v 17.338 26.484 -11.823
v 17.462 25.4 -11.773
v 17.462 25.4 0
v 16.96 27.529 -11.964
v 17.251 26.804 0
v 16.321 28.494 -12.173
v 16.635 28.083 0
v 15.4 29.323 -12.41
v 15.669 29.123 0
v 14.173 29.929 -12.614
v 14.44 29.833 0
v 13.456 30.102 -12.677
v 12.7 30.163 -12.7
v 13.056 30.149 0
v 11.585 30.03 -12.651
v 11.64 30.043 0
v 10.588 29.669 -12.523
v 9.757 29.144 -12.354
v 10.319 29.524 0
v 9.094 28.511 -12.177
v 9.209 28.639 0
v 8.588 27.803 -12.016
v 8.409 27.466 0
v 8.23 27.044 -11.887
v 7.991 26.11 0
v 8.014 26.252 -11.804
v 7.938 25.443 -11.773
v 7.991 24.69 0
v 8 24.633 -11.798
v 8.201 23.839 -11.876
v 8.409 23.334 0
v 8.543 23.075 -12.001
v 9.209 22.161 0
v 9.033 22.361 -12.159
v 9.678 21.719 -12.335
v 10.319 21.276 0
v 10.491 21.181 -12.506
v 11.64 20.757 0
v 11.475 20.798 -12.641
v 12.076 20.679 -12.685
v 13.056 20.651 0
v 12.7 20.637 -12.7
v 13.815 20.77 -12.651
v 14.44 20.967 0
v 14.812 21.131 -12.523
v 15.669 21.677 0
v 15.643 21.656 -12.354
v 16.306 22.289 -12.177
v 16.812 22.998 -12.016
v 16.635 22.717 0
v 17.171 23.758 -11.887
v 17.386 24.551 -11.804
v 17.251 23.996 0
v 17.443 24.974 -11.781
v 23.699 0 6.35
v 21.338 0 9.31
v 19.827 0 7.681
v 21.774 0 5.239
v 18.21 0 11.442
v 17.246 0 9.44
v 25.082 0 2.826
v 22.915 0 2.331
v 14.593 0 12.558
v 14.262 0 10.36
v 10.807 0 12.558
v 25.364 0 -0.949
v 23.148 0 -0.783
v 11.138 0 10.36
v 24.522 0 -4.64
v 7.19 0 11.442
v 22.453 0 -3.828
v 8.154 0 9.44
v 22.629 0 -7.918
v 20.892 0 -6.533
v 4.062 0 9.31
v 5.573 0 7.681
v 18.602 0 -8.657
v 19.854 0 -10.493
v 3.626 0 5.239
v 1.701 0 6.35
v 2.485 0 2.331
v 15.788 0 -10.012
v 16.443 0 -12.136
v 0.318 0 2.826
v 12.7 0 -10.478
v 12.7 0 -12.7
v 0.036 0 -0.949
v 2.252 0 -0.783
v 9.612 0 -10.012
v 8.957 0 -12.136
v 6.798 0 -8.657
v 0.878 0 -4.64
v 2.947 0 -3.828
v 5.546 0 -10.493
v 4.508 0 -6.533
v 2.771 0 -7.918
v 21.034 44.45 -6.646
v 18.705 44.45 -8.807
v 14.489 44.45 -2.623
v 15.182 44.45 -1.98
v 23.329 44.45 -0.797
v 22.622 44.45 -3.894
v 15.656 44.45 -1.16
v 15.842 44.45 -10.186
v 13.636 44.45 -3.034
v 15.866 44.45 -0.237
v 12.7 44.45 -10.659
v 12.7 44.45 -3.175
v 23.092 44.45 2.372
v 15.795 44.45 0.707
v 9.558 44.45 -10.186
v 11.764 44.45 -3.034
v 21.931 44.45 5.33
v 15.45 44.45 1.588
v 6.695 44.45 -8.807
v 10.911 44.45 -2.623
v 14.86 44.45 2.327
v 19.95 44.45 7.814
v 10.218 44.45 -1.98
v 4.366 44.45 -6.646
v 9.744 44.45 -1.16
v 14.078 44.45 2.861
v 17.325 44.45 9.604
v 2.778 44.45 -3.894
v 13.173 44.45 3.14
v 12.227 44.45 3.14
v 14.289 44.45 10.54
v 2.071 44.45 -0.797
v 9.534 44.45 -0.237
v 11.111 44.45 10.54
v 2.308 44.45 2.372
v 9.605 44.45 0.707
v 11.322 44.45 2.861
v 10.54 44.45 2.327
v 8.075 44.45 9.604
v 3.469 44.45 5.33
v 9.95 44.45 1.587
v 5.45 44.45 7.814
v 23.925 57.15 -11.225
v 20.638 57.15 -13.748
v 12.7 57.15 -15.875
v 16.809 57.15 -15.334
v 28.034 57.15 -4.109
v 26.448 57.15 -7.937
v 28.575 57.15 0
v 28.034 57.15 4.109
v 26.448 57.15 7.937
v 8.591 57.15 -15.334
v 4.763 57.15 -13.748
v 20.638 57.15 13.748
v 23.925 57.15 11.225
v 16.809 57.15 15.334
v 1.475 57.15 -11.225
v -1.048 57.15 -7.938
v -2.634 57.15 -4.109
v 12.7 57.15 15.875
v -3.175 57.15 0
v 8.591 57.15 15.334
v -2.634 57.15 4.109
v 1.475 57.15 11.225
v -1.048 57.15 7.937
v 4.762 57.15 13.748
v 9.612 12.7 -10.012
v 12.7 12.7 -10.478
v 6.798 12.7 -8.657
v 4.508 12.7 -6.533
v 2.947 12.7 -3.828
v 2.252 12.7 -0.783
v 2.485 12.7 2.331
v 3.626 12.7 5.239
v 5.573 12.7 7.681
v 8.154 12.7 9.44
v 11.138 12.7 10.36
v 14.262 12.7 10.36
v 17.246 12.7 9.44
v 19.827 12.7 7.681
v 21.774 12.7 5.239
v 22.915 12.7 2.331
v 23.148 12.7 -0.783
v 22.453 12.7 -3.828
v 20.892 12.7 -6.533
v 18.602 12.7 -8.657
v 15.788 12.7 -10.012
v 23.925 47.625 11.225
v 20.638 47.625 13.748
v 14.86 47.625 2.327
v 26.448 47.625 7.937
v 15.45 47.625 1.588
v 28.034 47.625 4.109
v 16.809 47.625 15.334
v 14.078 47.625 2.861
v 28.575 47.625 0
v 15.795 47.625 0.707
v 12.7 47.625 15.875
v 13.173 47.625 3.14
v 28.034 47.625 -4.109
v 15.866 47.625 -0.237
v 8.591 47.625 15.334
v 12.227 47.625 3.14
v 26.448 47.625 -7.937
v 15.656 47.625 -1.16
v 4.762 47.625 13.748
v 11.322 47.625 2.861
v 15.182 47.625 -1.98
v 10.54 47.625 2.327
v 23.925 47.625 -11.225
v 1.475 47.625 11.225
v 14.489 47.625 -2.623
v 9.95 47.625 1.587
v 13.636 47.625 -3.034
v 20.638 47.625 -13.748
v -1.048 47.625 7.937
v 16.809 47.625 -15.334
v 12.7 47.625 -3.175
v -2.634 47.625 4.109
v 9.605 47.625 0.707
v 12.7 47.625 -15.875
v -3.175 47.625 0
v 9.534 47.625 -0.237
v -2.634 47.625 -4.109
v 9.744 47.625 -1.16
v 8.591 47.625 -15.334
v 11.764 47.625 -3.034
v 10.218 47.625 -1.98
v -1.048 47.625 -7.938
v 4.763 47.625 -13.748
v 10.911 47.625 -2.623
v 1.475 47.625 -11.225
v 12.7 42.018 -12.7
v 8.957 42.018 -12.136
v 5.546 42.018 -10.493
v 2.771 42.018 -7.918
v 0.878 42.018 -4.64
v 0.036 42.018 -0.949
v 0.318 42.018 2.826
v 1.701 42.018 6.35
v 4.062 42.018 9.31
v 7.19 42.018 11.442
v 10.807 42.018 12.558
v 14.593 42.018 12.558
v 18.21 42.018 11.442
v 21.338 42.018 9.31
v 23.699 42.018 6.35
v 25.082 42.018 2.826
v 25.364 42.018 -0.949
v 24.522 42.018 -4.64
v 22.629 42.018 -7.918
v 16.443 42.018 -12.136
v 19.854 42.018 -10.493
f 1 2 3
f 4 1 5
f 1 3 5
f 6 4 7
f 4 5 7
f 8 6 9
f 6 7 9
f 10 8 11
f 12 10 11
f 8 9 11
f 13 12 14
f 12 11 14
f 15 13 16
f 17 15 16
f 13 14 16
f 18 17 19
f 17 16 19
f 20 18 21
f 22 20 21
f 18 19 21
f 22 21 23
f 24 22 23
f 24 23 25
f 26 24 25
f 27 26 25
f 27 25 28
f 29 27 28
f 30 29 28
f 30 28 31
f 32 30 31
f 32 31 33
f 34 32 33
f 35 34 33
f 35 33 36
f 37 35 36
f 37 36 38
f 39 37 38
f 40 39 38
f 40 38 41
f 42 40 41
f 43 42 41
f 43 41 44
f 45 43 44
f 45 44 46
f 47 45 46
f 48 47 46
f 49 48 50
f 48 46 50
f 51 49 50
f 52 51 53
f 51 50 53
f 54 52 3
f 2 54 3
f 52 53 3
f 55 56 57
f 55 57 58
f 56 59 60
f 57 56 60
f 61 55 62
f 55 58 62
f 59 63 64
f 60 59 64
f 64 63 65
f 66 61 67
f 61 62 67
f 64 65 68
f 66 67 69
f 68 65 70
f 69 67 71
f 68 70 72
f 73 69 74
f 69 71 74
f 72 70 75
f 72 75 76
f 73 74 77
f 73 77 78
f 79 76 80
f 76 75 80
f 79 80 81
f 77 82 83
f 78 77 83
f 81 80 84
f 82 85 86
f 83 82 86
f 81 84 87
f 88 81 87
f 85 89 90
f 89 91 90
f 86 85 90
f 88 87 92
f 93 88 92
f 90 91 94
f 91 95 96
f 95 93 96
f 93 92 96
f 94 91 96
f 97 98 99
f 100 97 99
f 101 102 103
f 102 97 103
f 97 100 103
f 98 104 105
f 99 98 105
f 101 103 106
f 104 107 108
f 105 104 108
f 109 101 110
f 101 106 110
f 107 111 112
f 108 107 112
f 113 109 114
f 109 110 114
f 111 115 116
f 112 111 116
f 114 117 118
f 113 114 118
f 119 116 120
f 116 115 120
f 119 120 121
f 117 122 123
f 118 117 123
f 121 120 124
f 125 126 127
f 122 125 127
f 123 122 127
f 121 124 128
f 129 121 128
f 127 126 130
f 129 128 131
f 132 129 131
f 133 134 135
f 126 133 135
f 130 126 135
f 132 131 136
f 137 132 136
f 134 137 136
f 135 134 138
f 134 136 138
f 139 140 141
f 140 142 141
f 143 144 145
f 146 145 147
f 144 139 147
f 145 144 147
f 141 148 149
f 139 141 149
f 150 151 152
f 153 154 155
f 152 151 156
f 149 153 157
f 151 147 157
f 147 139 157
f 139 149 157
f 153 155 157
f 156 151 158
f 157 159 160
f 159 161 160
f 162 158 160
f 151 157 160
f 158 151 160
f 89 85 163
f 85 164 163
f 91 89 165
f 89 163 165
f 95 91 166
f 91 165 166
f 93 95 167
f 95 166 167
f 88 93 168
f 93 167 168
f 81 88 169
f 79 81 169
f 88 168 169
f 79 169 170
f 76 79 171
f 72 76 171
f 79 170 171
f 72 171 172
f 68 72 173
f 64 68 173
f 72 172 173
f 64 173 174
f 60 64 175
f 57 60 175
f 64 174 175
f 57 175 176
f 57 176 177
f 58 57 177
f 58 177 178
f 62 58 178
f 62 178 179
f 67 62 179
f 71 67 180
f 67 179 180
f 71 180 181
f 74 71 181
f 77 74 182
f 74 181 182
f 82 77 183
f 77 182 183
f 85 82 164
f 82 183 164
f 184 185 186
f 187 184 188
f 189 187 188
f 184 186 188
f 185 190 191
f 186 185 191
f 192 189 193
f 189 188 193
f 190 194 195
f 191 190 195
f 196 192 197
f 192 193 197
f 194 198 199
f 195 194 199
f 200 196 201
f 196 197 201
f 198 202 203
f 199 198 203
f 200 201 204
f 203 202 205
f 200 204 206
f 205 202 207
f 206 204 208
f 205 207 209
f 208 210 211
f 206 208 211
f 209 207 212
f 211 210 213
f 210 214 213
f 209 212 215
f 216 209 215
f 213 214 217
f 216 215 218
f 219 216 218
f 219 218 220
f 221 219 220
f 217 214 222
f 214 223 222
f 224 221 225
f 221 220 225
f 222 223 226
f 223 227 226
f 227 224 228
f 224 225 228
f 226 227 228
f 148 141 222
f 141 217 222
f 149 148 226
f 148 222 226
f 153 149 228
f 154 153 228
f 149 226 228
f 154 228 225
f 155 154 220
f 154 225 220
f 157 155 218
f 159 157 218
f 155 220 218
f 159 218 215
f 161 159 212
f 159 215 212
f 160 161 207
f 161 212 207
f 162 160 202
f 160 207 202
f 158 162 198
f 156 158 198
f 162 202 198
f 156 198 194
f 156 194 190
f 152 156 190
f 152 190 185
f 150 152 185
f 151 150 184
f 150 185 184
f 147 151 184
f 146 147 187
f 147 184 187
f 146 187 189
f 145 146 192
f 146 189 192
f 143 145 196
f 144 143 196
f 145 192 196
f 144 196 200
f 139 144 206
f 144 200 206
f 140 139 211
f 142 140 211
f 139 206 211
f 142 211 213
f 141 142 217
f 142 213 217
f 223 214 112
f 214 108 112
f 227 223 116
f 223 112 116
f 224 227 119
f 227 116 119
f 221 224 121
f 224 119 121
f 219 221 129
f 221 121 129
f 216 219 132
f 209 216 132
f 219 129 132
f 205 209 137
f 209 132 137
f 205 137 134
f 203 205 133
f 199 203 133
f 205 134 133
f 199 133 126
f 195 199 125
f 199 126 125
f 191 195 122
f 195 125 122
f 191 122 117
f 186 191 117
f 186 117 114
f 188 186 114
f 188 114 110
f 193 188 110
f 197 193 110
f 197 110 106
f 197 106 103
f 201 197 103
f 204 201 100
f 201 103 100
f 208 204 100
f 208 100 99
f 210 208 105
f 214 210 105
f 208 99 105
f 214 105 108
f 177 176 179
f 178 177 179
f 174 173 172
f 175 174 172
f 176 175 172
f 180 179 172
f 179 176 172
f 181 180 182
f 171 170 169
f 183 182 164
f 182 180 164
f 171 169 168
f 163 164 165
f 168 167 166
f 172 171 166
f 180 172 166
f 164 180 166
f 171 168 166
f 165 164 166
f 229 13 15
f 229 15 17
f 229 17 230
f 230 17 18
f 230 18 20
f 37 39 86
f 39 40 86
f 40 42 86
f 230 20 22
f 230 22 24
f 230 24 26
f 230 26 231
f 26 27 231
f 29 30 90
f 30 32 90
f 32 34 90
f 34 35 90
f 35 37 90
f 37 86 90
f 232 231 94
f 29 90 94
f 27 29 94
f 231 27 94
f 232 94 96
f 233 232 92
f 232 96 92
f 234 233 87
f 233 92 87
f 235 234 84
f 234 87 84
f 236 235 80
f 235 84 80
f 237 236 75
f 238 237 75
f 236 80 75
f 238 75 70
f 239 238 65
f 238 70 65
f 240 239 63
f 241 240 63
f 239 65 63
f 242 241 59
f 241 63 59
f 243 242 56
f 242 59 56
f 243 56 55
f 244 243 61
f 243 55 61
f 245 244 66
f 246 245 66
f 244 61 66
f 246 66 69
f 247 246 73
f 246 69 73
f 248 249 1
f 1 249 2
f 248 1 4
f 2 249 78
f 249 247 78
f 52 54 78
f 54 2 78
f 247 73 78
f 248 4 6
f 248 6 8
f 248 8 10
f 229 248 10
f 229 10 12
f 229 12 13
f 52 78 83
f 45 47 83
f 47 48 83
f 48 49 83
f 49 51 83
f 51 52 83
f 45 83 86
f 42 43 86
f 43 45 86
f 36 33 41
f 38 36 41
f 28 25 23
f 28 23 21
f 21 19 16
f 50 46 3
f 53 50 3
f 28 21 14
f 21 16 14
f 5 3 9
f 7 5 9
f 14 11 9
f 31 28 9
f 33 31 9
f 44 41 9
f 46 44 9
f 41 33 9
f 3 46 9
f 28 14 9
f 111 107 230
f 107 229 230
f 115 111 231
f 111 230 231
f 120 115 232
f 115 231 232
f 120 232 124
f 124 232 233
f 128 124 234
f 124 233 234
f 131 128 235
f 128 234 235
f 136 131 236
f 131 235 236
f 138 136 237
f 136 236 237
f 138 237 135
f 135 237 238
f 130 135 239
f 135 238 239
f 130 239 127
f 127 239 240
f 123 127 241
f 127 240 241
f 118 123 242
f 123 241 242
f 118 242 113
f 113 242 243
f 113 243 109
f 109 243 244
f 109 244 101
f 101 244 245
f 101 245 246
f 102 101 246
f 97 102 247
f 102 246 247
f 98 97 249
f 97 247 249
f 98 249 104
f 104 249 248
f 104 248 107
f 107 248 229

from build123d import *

# Parameters (mm, degrees)
SKETCH3_R          = 4.7625
CUT_EXTRUDE1_DEPTH = 66.838201297


with BuildPart() as part:
    # Sketch2 → Revolve1 (revolve)
    with BuildSketch(Plane.XY, mode=Mode.PRIVATE) as revolve1_sk:
        Polygon((2.040850661, 44.45), (0, 42.017808893), (0, 0), (2.2225, 0), (2.2225, 12.7), (12.7, 12.7), (12.7, 57.15), (-3.175, 57.15), (-3.175, 47.625), (9.525, 47.625), (9.525, 44.45), align=None)
    revolve(revolve1_sk.sketch.rotate(Axis((12.7, 12.7, 0), (0, 1, 0)), 270), axis=Axis((12.7, 12.7, 0), (0, 1, 0)))

    # Sketch3 → Cut-Extrude1 (cut, through all)
    with BuildSketch(Plane.XY):
        with Locations((12.7, 25.4)):
            Circle(SKETCH3_R)
    extrude(amount=-CUT_EXTRUDE1_DEPTH, mode=Mode.SUBTRACT)


solid = part.part
